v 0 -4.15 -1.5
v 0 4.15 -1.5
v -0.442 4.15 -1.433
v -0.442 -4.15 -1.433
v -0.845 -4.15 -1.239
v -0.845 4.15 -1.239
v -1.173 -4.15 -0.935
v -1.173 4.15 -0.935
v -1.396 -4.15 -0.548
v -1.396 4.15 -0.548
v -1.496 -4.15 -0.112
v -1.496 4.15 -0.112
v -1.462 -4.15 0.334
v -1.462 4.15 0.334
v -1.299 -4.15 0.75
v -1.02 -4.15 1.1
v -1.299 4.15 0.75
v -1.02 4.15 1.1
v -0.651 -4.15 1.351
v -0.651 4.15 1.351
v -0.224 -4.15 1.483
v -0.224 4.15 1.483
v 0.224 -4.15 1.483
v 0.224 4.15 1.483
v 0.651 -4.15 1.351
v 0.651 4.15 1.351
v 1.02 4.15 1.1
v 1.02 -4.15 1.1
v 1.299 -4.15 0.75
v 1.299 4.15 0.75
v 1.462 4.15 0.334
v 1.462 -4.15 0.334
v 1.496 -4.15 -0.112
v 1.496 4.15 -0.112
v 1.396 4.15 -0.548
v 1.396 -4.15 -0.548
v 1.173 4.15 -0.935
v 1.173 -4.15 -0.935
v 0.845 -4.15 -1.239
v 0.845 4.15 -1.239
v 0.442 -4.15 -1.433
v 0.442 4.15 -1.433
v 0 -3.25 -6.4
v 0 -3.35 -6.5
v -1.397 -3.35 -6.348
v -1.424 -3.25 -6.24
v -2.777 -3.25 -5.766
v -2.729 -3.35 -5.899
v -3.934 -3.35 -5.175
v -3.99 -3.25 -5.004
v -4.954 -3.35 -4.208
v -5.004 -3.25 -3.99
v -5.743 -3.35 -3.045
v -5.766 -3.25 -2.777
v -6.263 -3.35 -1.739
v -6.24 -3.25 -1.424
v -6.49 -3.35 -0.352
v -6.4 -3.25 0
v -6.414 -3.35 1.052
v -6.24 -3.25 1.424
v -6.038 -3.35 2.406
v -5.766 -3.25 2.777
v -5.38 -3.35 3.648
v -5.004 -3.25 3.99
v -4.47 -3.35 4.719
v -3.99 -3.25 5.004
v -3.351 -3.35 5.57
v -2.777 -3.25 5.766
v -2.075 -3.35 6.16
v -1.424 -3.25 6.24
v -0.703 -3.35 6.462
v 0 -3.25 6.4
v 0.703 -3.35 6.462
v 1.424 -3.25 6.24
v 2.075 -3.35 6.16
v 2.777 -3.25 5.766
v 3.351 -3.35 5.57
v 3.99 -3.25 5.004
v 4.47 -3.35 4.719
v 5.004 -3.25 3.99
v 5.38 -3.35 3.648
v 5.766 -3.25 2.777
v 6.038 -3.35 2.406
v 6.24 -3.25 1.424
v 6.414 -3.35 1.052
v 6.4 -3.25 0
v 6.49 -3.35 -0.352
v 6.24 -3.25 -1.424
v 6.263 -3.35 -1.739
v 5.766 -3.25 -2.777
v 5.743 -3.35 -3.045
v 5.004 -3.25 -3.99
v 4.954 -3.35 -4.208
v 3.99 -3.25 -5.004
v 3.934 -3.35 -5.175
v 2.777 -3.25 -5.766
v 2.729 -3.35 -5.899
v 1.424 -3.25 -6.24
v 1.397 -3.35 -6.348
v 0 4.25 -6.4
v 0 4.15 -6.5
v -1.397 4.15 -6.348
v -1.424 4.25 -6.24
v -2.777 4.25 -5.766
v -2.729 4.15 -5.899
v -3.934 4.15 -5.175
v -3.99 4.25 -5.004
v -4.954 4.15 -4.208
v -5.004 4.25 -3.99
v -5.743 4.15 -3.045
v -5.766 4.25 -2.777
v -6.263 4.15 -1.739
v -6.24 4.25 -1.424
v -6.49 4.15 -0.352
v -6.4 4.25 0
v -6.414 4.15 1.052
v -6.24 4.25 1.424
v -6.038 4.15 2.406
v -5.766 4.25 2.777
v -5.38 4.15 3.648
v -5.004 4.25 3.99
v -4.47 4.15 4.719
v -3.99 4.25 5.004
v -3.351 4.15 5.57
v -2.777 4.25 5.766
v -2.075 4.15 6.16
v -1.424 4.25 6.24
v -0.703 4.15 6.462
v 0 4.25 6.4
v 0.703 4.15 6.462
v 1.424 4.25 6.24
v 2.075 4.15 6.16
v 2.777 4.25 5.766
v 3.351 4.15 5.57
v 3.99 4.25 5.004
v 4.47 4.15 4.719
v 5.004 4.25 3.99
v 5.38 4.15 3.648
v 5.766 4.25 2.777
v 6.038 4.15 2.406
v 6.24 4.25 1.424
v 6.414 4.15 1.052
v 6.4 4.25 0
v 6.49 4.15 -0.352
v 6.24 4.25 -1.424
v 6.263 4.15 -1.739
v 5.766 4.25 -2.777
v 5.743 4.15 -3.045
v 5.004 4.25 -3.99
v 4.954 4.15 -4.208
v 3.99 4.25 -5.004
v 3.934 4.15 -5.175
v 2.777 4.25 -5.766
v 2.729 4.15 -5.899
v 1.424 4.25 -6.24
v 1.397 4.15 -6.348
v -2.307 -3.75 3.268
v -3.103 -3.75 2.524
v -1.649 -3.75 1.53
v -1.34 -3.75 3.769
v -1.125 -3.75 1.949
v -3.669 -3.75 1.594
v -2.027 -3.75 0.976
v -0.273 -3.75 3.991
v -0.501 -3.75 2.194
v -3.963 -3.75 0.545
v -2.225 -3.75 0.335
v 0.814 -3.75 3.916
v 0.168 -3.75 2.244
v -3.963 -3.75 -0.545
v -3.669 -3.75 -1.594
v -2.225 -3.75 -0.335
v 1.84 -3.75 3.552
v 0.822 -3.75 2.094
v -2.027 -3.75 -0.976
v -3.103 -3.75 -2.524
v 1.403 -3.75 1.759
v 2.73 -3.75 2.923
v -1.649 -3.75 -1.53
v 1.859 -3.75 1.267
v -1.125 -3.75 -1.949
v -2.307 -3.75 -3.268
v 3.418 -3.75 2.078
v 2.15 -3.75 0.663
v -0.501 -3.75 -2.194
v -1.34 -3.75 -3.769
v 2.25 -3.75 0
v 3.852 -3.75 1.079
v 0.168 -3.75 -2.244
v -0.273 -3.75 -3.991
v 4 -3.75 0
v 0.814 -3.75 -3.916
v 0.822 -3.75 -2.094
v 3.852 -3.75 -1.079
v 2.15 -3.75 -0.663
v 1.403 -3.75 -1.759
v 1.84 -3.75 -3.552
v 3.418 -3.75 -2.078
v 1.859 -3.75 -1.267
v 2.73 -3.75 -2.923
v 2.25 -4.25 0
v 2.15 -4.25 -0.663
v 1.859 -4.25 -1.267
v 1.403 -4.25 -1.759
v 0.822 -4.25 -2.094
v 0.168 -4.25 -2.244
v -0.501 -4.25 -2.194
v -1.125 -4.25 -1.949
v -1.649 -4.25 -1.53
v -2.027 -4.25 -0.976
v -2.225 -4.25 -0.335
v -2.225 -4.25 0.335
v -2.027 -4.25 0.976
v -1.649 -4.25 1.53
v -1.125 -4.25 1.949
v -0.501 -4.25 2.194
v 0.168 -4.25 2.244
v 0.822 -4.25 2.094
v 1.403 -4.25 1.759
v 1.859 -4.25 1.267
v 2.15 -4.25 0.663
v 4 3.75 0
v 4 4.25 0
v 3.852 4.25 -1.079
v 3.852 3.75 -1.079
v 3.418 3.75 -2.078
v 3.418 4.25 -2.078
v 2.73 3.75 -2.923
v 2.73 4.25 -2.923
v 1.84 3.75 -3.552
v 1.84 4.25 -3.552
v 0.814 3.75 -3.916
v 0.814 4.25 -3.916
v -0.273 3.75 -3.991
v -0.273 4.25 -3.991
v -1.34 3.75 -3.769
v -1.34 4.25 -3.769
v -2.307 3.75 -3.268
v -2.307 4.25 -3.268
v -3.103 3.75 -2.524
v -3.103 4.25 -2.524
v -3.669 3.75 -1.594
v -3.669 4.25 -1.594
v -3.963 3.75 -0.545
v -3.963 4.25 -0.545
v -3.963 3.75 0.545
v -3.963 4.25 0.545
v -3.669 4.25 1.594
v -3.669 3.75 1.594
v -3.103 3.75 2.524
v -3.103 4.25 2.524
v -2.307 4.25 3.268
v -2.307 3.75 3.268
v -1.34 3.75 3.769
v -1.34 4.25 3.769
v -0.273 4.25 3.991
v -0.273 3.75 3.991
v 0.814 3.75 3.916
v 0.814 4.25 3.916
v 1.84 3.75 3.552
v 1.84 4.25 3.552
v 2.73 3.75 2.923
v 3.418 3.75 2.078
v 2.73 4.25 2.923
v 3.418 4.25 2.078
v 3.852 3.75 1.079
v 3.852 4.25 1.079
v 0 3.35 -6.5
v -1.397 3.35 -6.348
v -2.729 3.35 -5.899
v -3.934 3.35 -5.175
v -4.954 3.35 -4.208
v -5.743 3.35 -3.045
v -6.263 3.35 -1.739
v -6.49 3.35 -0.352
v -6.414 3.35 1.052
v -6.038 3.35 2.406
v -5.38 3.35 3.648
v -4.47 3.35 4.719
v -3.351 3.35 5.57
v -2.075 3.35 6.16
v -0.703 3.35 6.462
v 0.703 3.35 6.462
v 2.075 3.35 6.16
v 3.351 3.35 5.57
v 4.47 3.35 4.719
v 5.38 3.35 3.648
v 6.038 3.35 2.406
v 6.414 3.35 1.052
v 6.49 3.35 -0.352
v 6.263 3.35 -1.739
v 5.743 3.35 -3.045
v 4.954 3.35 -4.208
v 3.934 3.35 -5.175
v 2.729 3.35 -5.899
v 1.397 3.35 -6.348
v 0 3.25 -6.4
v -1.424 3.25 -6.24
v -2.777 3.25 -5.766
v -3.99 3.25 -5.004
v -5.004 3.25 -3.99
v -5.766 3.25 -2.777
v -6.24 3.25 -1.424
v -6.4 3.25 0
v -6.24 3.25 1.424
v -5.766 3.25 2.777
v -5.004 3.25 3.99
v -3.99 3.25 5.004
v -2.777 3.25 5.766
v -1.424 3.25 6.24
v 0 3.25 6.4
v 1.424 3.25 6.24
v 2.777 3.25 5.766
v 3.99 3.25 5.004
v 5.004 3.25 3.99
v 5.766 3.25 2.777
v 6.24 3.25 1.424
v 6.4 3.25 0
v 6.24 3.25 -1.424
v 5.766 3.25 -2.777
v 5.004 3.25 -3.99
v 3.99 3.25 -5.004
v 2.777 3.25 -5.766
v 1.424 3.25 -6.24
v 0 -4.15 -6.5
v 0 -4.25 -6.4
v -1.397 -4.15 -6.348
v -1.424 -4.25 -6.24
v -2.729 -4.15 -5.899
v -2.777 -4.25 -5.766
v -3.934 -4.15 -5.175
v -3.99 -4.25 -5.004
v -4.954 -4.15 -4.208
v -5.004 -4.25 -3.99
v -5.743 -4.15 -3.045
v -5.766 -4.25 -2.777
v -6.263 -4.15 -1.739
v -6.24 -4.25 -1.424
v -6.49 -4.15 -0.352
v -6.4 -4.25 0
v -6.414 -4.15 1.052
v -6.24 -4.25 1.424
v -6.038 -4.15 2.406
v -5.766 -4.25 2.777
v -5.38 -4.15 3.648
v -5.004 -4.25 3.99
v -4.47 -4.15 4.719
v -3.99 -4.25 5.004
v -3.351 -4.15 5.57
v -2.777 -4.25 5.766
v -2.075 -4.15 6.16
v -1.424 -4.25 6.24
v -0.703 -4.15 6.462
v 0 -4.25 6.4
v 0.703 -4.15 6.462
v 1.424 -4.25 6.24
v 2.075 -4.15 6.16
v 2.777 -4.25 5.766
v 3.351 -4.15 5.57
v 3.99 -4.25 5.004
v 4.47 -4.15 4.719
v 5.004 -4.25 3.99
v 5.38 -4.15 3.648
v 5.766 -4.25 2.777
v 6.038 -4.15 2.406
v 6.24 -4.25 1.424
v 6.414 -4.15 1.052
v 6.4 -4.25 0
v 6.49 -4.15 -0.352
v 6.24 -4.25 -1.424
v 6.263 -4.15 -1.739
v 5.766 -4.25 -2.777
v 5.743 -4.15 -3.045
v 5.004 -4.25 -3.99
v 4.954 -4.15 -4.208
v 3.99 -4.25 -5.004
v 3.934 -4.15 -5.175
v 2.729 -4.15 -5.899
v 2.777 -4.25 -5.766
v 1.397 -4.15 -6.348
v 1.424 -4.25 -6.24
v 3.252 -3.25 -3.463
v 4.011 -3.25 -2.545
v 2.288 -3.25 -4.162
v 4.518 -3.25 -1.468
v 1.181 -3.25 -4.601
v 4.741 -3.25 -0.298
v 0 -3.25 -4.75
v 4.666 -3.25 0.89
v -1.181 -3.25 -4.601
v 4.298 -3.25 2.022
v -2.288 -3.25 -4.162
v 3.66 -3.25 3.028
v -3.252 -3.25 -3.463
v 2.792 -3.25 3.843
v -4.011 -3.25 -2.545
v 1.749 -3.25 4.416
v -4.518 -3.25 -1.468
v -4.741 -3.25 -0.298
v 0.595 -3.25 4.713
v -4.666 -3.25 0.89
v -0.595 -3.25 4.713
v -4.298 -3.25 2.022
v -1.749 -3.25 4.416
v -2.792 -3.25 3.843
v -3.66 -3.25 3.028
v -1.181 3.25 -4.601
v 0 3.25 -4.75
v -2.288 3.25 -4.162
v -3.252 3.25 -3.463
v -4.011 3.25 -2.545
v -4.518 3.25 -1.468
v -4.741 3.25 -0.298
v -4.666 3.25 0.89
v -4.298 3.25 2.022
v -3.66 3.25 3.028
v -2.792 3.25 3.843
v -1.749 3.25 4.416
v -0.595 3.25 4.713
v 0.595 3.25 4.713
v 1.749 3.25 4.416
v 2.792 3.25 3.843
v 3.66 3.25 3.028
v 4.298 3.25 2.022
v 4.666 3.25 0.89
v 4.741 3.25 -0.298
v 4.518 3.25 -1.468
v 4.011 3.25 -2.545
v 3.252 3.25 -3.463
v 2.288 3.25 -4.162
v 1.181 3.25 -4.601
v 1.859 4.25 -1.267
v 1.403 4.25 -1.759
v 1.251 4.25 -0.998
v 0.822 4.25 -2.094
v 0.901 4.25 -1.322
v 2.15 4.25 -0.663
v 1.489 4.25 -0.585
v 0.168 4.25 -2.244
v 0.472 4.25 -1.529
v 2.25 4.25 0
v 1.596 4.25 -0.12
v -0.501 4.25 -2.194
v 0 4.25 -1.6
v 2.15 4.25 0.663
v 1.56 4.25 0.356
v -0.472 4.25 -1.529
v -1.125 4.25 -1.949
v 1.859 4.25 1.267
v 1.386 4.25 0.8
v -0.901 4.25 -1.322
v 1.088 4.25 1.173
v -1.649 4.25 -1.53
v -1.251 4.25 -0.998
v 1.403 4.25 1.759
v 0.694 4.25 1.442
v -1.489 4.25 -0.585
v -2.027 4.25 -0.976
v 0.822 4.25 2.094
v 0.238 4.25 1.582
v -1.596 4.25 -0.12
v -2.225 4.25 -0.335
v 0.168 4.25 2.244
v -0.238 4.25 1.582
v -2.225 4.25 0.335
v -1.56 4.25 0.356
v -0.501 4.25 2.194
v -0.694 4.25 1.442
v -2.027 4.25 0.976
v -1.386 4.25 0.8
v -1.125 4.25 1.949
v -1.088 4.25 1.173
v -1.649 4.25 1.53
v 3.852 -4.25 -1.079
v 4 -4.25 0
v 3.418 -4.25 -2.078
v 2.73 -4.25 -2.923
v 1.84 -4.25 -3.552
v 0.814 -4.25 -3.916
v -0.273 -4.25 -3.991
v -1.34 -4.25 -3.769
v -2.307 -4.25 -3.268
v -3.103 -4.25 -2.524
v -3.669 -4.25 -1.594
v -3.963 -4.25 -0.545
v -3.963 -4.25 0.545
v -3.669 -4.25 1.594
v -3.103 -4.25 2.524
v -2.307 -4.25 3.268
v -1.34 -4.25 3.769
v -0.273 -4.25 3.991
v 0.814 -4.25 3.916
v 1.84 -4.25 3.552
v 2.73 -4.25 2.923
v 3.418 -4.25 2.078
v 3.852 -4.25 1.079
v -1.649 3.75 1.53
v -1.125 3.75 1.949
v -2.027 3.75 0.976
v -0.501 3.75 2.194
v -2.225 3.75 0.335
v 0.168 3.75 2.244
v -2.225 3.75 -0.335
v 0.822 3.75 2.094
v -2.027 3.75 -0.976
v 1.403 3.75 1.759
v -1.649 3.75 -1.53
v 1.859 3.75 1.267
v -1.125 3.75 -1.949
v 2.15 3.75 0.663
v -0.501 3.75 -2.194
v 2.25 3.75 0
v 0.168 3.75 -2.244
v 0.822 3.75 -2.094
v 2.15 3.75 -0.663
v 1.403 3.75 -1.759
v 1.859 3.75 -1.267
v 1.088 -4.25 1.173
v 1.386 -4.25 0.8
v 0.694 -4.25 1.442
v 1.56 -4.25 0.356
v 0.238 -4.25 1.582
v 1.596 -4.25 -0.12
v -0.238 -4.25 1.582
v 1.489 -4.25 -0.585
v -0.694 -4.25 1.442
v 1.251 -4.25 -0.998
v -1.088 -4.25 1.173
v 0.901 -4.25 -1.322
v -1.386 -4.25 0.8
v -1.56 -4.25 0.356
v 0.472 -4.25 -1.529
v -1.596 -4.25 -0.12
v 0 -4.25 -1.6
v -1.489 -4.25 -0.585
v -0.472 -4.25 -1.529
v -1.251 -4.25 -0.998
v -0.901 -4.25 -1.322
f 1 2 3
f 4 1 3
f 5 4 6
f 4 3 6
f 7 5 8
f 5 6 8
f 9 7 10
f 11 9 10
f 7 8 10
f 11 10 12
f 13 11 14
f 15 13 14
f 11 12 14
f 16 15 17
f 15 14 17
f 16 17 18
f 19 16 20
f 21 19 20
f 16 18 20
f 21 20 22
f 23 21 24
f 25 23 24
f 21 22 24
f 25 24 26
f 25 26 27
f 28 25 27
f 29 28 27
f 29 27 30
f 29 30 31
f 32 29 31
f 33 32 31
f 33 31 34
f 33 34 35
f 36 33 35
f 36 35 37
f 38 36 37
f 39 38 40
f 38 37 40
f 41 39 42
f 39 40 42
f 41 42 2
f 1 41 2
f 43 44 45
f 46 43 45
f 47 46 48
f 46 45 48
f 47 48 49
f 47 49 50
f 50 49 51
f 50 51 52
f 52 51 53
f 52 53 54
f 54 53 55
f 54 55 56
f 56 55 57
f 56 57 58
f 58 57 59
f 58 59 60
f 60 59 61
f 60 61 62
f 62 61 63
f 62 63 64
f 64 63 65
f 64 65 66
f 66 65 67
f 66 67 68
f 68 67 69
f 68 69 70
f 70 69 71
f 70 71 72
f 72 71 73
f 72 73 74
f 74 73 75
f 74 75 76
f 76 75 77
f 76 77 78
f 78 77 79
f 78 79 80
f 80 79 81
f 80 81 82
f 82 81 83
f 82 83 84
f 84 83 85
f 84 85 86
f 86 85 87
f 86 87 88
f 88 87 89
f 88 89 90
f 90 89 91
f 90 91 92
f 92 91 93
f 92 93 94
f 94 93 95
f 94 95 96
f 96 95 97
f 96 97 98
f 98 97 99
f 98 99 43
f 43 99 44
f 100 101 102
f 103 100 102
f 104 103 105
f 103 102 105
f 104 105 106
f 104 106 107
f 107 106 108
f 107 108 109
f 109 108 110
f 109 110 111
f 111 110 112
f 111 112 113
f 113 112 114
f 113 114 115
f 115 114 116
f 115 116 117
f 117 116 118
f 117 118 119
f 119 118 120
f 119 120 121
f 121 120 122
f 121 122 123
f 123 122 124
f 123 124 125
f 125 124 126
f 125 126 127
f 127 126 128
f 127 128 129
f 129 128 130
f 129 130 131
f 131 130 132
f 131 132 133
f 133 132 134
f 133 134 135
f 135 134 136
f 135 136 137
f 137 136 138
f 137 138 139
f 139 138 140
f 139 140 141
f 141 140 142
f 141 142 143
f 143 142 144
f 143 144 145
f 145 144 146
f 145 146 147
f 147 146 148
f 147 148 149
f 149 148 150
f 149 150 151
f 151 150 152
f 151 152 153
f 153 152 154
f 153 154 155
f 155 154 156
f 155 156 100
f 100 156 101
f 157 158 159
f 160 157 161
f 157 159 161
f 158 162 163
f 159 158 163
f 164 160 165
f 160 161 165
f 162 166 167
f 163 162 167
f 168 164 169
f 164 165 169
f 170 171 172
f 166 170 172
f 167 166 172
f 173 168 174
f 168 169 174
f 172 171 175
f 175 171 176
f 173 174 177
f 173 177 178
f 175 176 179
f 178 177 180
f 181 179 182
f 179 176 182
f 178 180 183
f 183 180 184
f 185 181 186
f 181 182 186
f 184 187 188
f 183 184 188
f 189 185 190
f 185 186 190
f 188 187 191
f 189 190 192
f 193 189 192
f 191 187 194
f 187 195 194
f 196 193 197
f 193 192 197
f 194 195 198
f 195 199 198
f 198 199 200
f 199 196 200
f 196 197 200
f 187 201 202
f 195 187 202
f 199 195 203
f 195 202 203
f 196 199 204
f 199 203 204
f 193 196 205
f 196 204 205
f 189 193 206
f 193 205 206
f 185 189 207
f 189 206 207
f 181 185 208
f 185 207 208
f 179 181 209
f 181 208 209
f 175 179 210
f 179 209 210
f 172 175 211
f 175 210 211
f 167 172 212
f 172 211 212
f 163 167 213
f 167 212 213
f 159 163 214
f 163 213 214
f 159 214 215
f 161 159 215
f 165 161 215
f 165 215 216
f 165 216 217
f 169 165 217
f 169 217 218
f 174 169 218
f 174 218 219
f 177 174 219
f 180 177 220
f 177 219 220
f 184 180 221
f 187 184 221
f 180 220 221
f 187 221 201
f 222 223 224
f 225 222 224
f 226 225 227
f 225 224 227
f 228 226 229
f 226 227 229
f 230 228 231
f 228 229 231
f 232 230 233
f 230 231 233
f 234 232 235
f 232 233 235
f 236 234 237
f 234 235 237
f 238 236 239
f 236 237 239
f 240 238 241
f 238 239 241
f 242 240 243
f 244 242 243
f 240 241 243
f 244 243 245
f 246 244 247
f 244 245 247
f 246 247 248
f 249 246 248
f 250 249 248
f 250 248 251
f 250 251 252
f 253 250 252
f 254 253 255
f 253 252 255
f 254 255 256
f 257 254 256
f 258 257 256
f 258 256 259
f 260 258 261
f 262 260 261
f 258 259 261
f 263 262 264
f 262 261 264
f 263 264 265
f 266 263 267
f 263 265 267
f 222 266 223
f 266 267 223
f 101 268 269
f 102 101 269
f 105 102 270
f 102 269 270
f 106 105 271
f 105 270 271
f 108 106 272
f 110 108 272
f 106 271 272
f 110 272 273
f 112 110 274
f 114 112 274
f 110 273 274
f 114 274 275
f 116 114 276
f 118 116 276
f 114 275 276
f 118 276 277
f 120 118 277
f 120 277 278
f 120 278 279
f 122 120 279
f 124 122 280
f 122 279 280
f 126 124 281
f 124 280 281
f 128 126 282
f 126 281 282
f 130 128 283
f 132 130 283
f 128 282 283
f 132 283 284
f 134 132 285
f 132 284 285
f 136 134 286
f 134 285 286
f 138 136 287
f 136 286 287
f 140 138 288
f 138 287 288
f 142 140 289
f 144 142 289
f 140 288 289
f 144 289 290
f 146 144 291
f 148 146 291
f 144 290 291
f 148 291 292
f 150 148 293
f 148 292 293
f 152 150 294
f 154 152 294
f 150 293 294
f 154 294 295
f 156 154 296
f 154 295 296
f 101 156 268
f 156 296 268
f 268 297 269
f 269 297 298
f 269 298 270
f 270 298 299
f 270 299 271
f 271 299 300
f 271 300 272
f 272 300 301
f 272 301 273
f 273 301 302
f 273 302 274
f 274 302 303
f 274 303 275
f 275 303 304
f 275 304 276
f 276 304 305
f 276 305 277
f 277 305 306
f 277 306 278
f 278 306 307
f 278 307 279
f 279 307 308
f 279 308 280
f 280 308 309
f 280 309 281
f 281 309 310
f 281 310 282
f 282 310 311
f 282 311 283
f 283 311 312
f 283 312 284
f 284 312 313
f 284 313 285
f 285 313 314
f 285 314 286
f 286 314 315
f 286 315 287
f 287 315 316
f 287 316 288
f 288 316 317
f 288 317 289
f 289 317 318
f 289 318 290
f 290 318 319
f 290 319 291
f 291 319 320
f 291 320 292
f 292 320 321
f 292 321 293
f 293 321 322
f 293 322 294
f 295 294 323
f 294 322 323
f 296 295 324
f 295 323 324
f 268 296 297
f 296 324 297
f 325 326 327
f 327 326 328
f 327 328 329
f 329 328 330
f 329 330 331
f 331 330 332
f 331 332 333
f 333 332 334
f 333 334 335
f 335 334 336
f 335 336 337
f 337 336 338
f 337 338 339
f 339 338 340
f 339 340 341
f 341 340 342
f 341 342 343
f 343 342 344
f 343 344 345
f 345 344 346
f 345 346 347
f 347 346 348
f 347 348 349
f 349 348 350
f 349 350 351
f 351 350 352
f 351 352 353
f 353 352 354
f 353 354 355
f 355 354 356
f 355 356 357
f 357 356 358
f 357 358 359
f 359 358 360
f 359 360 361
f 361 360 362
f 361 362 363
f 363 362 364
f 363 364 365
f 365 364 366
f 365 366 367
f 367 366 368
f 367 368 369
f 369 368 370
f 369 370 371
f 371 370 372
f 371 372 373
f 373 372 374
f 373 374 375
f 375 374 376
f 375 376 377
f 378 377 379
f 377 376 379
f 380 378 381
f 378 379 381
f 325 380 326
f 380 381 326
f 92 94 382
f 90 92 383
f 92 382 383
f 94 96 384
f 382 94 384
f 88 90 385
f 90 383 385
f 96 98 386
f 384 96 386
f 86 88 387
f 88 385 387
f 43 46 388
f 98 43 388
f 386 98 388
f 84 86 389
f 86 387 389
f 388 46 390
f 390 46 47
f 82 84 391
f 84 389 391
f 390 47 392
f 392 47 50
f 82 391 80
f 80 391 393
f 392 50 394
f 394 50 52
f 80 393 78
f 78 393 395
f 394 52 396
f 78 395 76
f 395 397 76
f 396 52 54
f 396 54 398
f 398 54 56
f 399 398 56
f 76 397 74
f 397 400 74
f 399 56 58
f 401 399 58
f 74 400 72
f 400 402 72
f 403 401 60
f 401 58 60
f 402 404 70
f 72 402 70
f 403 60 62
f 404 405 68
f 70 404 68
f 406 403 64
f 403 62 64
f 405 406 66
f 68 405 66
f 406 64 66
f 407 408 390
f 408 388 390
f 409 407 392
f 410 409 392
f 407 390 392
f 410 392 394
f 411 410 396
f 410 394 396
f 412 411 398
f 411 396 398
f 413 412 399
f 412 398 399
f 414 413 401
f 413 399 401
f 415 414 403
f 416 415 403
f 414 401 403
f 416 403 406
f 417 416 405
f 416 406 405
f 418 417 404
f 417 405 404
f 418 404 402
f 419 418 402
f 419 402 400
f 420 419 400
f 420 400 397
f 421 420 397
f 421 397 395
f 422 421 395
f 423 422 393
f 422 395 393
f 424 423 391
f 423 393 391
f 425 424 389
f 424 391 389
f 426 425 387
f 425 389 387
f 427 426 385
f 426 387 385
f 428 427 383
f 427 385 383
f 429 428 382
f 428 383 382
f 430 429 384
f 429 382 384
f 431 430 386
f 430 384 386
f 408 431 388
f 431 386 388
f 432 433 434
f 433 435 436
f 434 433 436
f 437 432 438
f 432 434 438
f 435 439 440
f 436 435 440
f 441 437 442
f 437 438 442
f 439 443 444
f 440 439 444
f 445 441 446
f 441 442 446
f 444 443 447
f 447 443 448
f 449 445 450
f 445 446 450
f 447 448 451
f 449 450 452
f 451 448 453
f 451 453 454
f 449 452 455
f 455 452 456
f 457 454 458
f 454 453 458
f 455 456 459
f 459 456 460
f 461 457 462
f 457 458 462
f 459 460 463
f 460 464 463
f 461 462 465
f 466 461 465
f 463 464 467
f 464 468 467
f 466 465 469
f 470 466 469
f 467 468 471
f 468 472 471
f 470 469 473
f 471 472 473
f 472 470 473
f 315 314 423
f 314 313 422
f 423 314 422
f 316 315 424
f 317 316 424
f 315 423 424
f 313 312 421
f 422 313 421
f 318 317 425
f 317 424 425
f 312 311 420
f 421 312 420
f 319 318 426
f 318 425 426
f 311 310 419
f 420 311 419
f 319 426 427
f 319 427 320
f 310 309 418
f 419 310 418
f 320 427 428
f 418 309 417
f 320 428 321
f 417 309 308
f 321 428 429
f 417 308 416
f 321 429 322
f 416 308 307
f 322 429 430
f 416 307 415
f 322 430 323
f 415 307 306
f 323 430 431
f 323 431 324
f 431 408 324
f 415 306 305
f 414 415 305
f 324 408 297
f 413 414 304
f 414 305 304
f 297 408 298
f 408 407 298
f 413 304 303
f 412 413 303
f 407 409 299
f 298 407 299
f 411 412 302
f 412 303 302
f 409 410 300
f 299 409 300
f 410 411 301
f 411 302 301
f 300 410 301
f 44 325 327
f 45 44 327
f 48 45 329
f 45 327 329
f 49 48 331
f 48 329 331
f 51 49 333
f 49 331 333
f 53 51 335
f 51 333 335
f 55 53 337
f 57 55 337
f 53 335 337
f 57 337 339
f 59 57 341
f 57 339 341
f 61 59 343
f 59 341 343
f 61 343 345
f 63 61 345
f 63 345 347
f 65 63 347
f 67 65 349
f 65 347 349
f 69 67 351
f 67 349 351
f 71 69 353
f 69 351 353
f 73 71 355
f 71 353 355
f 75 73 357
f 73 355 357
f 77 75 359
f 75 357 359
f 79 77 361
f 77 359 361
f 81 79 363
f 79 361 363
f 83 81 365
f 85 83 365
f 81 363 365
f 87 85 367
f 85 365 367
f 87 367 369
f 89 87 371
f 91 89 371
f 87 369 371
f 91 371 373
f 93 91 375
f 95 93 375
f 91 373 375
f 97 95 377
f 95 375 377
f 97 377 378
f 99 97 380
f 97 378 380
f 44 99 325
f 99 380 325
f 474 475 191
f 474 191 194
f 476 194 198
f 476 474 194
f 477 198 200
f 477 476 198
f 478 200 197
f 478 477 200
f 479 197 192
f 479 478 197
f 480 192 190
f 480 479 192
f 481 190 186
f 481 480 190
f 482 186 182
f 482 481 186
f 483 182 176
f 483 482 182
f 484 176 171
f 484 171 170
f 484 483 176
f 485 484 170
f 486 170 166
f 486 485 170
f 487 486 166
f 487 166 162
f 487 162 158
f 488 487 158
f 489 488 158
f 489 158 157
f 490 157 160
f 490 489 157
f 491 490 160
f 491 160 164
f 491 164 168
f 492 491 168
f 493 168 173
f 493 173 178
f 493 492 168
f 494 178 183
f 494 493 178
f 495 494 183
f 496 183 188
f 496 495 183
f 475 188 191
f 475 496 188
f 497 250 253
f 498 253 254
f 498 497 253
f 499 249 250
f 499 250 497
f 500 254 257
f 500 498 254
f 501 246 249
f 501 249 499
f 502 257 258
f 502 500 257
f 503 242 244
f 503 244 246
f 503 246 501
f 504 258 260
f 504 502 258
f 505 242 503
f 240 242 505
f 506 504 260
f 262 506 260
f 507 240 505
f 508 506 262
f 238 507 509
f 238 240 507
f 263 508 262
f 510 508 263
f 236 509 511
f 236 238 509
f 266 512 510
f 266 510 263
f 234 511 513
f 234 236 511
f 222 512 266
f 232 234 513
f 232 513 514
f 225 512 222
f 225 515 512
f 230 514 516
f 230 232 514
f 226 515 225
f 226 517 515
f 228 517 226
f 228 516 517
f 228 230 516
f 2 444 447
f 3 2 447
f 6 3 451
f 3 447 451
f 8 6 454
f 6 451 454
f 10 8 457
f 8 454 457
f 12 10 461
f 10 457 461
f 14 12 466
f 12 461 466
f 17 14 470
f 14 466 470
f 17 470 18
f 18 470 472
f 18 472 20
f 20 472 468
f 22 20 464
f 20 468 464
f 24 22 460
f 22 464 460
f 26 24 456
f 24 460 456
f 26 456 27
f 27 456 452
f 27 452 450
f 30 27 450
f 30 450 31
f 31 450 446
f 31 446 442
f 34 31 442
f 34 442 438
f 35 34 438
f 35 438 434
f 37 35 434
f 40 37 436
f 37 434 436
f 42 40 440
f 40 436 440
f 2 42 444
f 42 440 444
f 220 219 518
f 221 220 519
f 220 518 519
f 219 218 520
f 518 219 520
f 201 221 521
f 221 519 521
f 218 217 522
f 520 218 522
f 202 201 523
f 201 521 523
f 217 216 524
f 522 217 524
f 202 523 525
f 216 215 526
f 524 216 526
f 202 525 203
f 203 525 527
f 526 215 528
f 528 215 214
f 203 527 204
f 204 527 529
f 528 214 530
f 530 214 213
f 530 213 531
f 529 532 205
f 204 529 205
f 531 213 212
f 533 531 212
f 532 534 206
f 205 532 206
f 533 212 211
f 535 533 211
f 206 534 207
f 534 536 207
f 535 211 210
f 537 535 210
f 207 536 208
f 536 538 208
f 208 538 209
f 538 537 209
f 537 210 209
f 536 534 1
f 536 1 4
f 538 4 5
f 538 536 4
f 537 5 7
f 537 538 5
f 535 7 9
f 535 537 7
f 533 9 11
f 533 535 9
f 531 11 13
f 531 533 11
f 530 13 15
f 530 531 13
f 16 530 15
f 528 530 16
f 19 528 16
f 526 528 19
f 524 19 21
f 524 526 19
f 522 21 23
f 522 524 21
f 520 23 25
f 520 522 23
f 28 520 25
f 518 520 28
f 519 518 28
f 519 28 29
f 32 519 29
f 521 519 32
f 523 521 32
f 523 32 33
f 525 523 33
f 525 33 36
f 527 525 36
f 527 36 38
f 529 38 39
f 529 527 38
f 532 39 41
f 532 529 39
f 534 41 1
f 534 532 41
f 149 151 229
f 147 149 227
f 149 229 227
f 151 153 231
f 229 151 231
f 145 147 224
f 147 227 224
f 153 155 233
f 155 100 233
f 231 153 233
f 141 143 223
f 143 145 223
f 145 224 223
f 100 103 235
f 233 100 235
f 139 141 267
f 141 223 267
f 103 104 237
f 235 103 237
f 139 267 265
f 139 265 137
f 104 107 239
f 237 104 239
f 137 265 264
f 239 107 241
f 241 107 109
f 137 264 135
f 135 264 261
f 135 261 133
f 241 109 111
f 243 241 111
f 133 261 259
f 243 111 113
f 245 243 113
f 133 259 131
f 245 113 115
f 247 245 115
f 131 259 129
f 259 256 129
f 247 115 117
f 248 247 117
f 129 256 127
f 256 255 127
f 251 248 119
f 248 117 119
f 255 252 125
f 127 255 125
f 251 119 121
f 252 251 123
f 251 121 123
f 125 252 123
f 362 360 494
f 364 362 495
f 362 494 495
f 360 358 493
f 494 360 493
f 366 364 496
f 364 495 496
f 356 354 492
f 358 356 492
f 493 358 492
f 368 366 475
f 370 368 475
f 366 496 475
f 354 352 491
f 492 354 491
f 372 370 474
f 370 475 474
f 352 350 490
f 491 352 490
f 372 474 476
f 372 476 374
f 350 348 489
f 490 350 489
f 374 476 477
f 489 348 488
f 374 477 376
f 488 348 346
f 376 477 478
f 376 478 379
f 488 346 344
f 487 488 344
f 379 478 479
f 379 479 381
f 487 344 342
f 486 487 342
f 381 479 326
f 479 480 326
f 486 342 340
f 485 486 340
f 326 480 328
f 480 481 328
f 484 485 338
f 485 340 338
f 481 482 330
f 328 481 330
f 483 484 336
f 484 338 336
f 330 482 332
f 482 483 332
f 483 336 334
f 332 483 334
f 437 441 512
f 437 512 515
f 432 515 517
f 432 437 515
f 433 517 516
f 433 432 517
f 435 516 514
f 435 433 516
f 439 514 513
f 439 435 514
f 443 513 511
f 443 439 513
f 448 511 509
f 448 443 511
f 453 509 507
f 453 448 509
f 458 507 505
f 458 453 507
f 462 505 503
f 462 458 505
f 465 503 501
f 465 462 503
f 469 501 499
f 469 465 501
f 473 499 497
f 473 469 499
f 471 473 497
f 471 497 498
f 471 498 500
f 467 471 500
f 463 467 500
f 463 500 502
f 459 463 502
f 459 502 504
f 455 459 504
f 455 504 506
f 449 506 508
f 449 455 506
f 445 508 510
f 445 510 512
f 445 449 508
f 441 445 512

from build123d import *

# Parameters (mm, degrees)
CHAMFER1_SIZE      = 0.1
SKETCH2_R          = 4
SKETCH2_R_2        = 2.25
CUT_EXTRUDE1_DEPTH = 0.5


with BuildPart() as part:
    # Sketch1 → Revolve1 (revolve)
    with BuildSketch(Plane(origin=(0, 0, 0), x_dir=(0, 0, -1), z_dir=(1, 0, 0))):
        Polygon((1.5, -4.25), (1.5, 4.25), (6.5, 4.25), (6.5, 3.25), (4.75, 3.25), (4.75, -3.25), (6.5, -3.25), (6.5, -4.25), align=None)
    revolve(axis=Axis((0, 0, 0), (0, 1, 0)))

    # Chamfer1
    chamfer1_edges = [part.edges().sort_by_distance(p)[0] for p in [
        (0, -4.25, 1.5),
        (0, -4.25, 6.5),
        (0, -3.25, 6.5),
        (0, 3.25, 6.5),
        (0, 4.25, 6.5),
        (0, 4.25, 1.5),
    ]]
    chamfer(chamfer1_edges, length=CHAMFER1_SIZE)

    # Sketch2 → Cut-Extrude1 (cut)
    with BuildSketch(Plane(origin=(0, 4.25, 0), x_dir=(1, 0, 0), z_dir=(0, 1, 0))):
        Circle(SKETCH2_R)
        Circle(SKETCH2_R_2, mode=Mode.SUBTRACT)
    cut_extrude1 = extrude(amount=-CUT_EXTRUDE1_DEPTH, mode=Mode.SUBTRACT)

    # Mirror1: Cut-Extrude1 across plane
    add(cut_extrude1.mirror(Plane.ZX), mode=Mode.SUBTRACT)


solid = part.part
